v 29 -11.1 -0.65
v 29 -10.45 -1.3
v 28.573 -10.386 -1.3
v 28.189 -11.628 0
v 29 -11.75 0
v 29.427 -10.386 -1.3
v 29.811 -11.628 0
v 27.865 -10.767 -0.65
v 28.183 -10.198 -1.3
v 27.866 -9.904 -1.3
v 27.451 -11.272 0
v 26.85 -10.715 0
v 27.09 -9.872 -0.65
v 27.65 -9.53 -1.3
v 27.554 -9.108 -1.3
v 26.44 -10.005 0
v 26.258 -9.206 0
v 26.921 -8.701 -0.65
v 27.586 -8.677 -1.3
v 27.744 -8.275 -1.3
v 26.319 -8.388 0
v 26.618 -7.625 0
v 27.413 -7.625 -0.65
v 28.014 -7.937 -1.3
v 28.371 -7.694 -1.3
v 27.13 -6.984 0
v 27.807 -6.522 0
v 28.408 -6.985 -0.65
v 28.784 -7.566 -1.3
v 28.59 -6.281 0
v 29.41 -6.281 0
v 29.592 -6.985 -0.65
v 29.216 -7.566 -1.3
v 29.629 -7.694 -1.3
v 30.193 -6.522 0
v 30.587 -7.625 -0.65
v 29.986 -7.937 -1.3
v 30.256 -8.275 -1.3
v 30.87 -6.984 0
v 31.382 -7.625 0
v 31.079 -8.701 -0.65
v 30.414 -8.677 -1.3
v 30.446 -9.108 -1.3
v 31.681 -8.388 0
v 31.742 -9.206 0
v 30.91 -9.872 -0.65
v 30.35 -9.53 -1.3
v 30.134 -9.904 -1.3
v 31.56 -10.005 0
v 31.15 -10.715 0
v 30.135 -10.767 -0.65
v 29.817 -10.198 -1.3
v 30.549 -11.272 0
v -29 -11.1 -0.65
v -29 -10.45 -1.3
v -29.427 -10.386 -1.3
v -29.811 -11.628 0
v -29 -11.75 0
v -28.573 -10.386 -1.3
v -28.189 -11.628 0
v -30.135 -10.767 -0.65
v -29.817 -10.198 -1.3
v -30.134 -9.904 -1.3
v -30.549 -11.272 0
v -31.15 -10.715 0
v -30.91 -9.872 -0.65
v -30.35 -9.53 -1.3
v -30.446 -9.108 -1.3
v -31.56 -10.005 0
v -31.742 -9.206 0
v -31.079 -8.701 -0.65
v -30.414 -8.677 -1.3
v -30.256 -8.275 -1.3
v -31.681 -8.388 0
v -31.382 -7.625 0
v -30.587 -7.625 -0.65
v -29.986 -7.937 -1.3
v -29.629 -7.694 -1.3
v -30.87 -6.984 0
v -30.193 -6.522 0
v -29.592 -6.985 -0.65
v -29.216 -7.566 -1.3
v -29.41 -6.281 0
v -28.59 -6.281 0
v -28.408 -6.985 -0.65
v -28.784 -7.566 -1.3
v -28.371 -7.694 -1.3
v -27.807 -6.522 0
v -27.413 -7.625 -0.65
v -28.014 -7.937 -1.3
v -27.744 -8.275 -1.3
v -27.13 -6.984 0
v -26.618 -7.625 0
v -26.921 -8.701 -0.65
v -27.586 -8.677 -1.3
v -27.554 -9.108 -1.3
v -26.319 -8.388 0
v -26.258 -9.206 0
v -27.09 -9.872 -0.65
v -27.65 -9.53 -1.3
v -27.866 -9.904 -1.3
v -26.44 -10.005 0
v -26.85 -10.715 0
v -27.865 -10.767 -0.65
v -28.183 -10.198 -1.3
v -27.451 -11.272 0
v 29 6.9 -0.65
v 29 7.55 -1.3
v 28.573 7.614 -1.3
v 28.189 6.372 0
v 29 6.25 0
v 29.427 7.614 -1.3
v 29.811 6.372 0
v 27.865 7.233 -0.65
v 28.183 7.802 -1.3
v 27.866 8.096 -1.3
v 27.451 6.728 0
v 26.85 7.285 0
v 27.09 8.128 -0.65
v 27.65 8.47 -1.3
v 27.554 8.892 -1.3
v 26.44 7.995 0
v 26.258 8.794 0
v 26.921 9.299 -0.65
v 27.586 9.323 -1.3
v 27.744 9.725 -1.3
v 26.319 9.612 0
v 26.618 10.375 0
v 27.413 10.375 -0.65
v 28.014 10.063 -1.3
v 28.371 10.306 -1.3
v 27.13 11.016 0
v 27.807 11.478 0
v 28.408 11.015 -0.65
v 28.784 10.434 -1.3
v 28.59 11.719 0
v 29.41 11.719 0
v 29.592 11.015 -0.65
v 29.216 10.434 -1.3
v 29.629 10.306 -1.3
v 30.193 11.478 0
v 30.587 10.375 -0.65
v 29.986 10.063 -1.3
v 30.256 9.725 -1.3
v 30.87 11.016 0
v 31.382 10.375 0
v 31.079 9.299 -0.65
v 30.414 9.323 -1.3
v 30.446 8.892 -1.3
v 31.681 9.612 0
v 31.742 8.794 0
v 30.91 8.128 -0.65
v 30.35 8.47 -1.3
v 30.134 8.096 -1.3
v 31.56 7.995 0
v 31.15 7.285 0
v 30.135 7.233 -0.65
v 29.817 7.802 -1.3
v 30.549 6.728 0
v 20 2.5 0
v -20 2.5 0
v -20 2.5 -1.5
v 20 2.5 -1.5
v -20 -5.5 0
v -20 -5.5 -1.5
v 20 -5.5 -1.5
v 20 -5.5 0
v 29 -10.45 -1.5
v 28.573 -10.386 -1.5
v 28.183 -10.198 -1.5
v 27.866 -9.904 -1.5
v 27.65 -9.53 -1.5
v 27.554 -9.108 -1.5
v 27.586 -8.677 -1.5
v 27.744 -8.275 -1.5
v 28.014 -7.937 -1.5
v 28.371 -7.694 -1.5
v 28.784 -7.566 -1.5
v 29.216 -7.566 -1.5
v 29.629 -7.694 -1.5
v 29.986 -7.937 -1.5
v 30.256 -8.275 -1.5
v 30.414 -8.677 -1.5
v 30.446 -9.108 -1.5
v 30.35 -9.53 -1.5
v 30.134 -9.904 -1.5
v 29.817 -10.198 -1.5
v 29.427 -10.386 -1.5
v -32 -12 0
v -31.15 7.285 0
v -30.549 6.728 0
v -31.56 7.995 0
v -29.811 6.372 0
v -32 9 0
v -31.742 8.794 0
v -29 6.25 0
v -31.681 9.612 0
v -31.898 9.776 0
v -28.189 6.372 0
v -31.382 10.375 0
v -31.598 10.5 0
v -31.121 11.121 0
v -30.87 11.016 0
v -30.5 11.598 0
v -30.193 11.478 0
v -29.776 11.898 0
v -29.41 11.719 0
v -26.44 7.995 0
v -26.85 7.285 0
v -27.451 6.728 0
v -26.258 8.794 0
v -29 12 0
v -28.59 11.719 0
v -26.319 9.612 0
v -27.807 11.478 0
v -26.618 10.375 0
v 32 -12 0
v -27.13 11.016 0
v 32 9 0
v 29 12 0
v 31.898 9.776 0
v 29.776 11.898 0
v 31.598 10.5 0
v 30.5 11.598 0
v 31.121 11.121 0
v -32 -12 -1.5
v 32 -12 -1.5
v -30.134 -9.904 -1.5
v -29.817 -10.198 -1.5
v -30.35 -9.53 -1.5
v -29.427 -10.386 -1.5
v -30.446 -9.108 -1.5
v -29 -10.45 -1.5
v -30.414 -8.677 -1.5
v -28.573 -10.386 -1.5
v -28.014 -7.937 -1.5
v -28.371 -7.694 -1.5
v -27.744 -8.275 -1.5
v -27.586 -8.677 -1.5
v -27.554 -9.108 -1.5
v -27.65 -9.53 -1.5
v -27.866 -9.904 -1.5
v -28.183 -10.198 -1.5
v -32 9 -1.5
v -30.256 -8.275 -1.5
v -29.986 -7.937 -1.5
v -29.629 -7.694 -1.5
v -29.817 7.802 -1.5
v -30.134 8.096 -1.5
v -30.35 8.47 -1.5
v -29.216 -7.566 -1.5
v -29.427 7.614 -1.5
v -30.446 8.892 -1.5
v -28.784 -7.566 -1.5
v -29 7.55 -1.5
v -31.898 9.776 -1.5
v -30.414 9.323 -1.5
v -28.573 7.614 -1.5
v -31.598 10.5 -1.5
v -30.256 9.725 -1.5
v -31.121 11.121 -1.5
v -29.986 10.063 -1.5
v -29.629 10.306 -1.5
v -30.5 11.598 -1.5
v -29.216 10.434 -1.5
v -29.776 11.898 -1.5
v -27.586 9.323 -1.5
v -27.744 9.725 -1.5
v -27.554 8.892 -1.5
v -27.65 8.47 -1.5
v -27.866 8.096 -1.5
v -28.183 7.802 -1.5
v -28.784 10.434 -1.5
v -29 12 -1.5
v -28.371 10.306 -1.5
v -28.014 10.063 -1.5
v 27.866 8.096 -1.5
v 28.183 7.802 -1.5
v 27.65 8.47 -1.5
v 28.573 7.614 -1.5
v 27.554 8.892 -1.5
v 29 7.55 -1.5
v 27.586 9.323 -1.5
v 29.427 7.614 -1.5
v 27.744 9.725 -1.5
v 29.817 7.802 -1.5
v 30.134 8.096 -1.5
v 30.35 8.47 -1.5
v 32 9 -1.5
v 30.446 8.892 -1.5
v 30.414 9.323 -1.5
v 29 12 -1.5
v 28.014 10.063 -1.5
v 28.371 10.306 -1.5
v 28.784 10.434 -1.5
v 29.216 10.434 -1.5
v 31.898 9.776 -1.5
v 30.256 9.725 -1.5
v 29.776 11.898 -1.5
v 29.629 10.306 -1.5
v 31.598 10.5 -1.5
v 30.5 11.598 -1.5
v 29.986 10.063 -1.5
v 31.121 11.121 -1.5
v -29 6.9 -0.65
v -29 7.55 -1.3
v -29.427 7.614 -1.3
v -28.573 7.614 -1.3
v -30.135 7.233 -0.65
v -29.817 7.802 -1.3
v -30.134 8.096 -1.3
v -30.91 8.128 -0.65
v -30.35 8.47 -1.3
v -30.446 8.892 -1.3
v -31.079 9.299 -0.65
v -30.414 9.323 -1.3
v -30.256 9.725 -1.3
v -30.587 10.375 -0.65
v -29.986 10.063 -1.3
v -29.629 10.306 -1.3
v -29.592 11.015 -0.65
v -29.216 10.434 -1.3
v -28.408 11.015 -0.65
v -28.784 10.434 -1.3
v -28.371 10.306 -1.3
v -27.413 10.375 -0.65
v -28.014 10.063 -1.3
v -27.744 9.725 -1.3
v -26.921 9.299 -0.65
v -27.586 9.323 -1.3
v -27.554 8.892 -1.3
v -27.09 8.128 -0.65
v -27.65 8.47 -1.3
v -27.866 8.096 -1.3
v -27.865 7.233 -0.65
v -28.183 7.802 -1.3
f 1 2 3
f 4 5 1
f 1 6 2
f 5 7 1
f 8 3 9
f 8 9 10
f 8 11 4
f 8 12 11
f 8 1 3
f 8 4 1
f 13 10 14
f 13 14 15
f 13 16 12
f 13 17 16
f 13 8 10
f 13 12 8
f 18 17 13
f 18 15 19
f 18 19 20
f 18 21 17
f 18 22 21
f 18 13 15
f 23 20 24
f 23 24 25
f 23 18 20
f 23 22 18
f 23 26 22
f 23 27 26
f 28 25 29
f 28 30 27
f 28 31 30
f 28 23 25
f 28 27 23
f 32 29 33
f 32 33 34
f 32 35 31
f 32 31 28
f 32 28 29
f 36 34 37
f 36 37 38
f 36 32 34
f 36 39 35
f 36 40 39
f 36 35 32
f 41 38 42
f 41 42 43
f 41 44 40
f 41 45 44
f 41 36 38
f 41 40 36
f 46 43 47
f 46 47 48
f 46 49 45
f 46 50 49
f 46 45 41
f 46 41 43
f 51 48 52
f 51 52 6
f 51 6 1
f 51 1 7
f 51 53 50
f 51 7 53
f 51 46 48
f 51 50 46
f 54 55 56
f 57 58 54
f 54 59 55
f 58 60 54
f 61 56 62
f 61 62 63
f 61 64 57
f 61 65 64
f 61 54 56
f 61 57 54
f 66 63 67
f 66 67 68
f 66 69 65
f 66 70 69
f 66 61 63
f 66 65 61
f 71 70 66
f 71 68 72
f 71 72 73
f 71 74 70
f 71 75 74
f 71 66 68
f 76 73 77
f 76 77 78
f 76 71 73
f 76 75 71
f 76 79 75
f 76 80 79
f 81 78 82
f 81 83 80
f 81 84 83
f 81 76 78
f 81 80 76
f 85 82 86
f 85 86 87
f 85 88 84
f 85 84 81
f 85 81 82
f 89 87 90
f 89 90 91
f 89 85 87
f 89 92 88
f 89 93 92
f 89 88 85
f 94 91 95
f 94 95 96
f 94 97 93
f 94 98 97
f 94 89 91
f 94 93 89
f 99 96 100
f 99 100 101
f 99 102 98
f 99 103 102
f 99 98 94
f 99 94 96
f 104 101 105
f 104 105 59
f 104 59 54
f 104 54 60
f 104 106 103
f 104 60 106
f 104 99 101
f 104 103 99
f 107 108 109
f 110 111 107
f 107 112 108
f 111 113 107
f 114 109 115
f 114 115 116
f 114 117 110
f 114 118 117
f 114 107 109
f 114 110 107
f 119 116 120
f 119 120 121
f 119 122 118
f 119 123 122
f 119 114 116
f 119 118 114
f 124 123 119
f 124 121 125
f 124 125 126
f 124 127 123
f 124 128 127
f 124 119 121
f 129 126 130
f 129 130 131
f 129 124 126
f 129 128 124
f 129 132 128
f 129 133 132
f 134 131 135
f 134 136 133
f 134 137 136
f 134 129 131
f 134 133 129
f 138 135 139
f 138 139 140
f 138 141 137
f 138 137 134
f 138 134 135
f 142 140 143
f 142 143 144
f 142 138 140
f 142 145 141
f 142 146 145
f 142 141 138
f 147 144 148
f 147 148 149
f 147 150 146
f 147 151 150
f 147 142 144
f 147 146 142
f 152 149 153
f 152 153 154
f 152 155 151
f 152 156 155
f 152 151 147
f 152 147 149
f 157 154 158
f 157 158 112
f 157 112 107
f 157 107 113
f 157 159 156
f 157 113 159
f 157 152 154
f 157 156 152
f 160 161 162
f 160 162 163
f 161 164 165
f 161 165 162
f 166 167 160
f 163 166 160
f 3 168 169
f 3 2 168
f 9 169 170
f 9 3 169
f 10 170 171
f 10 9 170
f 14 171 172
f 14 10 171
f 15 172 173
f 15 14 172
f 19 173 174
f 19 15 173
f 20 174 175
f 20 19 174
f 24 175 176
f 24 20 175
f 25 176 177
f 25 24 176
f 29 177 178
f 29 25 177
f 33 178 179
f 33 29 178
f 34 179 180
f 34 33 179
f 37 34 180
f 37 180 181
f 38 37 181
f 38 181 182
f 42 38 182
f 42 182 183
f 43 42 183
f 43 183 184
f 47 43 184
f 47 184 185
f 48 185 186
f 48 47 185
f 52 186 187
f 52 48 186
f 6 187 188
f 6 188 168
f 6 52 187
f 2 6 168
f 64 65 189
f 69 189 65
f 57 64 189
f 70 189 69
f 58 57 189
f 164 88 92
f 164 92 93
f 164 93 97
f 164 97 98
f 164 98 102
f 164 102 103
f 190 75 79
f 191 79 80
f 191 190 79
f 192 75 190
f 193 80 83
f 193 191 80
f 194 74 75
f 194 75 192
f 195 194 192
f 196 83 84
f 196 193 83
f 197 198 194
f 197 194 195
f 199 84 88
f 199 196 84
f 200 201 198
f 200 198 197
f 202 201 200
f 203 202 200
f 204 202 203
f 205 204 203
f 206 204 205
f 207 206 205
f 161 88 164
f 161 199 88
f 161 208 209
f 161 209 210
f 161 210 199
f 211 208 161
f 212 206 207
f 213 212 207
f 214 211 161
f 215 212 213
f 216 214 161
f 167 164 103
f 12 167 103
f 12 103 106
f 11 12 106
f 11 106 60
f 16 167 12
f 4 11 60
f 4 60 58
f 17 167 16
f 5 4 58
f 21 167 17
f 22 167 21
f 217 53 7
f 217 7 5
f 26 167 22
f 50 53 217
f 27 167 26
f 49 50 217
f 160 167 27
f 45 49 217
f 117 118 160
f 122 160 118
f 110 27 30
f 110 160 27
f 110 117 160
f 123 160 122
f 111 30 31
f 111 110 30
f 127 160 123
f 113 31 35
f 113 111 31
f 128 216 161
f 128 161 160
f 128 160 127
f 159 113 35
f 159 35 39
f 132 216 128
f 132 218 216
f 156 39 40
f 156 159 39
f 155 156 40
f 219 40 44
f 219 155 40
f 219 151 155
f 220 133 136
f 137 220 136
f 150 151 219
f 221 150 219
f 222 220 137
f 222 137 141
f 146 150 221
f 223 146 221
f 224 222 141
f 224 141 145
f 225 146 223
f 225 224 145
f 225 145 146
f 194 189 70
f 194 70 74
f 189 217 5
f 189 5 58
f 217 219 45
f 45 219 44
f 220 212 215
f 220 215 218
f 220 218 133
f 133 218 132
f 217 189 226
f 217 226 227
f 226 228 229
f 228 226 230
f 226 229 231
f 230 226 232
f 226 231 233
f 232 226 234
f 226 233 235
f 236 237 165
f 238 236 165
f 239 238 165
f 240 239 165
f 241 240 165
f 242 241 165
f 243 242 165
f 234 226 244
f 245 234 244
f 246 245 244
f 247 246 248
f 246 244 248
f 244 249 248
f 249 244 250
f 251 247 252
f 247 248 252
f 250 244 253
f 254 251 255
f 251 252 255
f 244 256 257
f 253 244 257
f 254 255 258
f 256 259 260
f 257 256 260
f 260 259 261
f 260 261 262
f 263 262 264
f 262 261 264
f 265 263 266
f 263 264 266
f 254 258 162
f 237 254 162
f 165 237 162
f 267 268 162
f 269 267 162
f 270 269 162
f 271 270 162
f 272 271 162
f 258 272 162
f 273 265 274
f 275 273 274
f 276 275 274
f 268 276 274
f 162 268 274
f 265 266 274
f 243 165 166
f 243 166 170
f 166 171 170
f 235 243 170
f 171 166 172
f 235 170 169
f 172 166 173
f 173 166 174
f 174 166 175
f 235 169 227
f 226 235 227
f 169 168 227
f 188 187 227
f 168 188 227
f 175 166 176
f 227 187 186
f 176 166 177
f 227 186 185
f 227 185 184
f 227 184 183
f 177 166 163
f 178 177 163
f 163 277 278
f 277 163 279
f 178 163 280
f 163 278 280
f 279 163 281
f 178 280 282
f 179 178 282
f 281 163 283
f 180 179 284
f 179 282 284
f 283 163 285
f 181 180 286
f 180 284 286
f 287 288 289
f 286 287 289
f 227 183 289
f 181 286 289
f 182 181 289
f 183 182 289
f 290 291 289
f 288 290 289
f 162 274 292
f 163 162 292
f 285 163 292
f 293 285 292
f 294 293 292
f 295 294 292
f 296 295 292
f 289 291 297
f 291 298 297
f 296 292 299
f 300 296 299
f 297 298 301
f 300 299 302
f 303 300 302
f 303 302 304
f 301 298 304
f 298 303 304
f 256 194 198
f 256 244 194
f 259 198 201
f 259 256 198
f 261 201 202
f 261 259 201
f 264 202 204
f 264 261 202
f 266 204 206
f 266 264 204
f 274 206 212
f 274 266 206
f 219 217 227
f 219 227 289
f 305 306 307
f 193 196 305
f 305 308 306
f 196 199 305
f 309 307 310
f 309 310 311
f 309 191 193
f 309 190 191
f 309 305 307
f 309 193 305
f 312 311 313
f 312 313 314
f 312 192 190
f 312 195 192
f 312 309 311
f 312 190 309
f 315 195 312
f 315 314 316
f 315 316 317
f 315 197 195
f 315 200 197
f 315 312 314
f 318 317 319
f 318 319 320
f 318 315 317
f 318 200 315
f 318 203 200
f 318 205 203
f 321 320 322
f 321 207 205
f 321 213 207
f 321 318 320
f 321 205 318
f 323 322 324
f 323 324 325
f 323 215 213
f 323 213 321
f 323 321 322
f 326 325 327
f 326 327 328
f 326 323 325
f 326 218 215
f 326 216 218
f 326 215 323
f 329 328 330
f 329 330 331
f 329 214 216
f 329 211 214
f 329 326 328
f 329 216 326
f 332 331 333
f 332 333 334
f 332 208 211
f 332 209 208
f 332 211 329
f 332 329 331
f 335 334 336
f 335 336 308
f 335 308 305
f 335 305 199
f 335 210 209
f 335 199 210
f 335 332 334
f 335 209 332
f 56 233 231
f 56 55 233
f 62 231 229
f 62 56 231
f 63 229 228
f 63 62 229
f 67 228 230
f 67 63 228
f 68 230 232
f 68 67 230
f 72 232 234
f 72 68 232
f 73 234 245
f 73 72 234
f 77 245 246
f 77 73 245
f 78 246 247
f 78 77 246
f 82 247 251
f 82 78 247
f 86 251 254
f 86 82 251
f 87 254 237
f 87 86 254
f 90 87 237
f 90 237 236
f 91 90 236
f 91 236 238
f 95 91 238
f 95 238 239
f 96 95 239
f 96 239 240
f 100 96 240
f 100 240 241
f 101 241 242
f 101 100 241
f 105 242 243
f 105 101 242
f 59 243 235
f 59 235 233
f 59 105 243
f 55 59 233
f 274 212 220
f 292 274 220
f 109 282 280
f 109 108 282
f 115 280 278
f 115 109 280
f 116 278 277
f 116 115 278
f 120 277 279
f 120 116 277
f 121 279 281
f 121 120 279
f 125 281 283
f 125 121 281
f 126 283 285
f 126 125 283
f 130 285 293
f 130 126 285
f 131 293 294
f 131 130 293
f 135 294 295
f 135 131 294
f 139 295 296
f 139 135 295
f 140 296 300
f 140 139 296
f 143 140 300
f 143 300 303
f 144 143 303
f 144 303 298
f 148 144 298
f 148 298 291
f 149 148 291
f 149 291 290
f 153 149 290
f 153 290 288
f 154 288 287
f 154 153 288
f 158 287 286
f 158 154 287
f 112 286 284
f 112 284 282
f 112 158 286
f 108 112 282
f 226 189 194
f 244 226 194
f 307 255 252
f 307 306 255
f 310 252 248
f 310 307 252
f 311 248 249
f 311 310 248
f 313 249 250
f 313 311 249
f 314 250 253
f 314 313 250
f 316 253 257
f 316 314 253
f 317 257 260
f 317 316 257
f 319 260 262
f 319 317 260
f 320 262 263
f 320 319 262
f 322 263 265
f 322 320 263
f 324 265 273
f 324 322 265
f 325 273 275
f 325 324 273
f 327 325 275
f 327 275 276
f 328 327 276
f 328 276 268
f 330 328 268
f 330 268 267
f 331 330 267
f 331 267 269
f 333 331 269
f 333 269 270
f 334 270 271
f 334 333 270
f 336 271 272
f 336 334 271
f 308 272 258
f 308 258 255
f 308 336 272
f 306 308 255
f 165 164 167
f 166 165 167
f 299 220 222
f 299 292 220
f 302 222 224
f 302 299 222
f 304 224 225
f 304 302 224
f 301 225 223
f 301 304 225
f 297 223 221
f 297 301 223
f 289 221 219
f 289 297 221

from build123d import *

# Parameters (mm, degrees)
SKETCH1_W                                      = 64
SKETCH1_H                                      = 24
BOSS_EXTRUDE1_DEPTH                            = 1.5
SKETCH2_W                                      = 40
SKETCH2_H                                      = 8
CUT_EXTRUDE1_DEPTH                             = 35.208916966
FILLET1_R                                      = 3
CSK_FOR_M2_5_FLAT_HEAD_MACHINE_SCREW1_AT_COUNT = 2
CSK_FOR_M2_5_FLAT_HEAD_MACHINE_SCREW1_AT_PITCH = 58
CSK_FOR_M2_5_FLAT_HEAD_MACHINE_SCREW_2_COUNT   = 2
CSK_FOR_M2_5_FLAT_HEAD_MACHINE_SCREW_2_PITCH   = 18
CSK_FOR_M2_5_FLAT_HEAD_MACHINE_SCREW_3_COUNT   = 2
CSK_FOR_M2_5_FLAT_HEAD_MACHINE_SCREW_3_PITCH   = 60.728905803


with BuildPart() as part:
    # Sketch1 → Boss-Extrude1 (new body)
    with BuildSketch(Plane.XY):
        Rectangle(SKETCH1_W, SKETCH1_H)
    extrude(amount=-BOSS_EXTRUDE1_DEPTH)

    # Sketch2 → Cut-Extrude1 (cut, through all)
    with BuildSketch(Plane.XY):
        with Locations((0, -1.5)):
            Rectangle(SKETCH2_W, SKETCH2_H)
    extrude(amount=-CUT_EXTRUDE1_DEPTH, mode=Mode.SUBTRACT)

    # Fillet1
    fillet1_edges = [part.edges().sort_by_distance(p)[0] for p in [
        (-32, 12, -0.75),
        (32, 12, -0.75),
    ]]
    fillet(fillet1_edges, radius=FILLET1_R)

    # Sketch3 → CSK for M2.5 Flat Head Machine Screw1 (revolve, cut)
    with BuildSketch(Plane(origin=(-29, 9, 0), x_dir=(0, -1, 0), z_dir=(1, 0, 0))):
        Polygon((0, 0), (0, 1.5), (1.45, 1.5), (1.45, 1.3), (2.75, 0), align=None)
    csk_for_m2_5_flat_head_machine_screw1 = revolve(axis=Axis((-29, 9, 6.35), (0, 0, -1)), mode=Mode.SUBTRACT)

    # CSK for M2.5 Flat Head Machine Screw1 at: CSK for M2.5 Flat Head Machine Screw1 ×2
    with Locations(*[(i * CSK_FOR_M2_5_FLAT_HEAD_MACHINE_SCREW1_AT_PITCH, 0, 0) for i in range(1, CSK_FOR_M2_5_FLAT_HEAD_MACHINE_SCREW1_AT_COUNT)]):
        add(csk_for_m2_5_flat_head_machine_screw1, mode=Mode.SUBTRACT)

    # CSK for M2.5 Flat Head Machine Screw 2: CSK for M2.5 Flat Head Machine Screw1 ×2
    with Locations(*[(0, -i * CSK_FOR_M2_5_FLAT_HEAD_MACHINE_SCREW_2_PITCH, 0) for i in range(1, CSK_FOR_M2_5_FLAT_HEAD_MACHINE_SCREW_2_COUNT)]):
        add(csk_for_m2_5_flat_head_machine_screw1, mode=Mode.SUBTRACT)

    # CSK for M2.5 Flat Head Machine Screw 3: CSK for M2.5 Flat Head Machine Screw1 ×2
    with Locations(*[Vector(0.9550641368112371, -0.29639921487245297, 0) * (i * CSK_FOR_M2_5_FLAT_HEAD_MACHINE_SCREW_3_PITCH) for i in range(1, CSK_FOR_M2_5_FLAT_HEAD_MACHINE_SCREW_3_COUNT)]):
        add(csk_for_m2_5_flat_head_machine_screw1, mode=Mode.SUBTRACT)


solid = part.part
